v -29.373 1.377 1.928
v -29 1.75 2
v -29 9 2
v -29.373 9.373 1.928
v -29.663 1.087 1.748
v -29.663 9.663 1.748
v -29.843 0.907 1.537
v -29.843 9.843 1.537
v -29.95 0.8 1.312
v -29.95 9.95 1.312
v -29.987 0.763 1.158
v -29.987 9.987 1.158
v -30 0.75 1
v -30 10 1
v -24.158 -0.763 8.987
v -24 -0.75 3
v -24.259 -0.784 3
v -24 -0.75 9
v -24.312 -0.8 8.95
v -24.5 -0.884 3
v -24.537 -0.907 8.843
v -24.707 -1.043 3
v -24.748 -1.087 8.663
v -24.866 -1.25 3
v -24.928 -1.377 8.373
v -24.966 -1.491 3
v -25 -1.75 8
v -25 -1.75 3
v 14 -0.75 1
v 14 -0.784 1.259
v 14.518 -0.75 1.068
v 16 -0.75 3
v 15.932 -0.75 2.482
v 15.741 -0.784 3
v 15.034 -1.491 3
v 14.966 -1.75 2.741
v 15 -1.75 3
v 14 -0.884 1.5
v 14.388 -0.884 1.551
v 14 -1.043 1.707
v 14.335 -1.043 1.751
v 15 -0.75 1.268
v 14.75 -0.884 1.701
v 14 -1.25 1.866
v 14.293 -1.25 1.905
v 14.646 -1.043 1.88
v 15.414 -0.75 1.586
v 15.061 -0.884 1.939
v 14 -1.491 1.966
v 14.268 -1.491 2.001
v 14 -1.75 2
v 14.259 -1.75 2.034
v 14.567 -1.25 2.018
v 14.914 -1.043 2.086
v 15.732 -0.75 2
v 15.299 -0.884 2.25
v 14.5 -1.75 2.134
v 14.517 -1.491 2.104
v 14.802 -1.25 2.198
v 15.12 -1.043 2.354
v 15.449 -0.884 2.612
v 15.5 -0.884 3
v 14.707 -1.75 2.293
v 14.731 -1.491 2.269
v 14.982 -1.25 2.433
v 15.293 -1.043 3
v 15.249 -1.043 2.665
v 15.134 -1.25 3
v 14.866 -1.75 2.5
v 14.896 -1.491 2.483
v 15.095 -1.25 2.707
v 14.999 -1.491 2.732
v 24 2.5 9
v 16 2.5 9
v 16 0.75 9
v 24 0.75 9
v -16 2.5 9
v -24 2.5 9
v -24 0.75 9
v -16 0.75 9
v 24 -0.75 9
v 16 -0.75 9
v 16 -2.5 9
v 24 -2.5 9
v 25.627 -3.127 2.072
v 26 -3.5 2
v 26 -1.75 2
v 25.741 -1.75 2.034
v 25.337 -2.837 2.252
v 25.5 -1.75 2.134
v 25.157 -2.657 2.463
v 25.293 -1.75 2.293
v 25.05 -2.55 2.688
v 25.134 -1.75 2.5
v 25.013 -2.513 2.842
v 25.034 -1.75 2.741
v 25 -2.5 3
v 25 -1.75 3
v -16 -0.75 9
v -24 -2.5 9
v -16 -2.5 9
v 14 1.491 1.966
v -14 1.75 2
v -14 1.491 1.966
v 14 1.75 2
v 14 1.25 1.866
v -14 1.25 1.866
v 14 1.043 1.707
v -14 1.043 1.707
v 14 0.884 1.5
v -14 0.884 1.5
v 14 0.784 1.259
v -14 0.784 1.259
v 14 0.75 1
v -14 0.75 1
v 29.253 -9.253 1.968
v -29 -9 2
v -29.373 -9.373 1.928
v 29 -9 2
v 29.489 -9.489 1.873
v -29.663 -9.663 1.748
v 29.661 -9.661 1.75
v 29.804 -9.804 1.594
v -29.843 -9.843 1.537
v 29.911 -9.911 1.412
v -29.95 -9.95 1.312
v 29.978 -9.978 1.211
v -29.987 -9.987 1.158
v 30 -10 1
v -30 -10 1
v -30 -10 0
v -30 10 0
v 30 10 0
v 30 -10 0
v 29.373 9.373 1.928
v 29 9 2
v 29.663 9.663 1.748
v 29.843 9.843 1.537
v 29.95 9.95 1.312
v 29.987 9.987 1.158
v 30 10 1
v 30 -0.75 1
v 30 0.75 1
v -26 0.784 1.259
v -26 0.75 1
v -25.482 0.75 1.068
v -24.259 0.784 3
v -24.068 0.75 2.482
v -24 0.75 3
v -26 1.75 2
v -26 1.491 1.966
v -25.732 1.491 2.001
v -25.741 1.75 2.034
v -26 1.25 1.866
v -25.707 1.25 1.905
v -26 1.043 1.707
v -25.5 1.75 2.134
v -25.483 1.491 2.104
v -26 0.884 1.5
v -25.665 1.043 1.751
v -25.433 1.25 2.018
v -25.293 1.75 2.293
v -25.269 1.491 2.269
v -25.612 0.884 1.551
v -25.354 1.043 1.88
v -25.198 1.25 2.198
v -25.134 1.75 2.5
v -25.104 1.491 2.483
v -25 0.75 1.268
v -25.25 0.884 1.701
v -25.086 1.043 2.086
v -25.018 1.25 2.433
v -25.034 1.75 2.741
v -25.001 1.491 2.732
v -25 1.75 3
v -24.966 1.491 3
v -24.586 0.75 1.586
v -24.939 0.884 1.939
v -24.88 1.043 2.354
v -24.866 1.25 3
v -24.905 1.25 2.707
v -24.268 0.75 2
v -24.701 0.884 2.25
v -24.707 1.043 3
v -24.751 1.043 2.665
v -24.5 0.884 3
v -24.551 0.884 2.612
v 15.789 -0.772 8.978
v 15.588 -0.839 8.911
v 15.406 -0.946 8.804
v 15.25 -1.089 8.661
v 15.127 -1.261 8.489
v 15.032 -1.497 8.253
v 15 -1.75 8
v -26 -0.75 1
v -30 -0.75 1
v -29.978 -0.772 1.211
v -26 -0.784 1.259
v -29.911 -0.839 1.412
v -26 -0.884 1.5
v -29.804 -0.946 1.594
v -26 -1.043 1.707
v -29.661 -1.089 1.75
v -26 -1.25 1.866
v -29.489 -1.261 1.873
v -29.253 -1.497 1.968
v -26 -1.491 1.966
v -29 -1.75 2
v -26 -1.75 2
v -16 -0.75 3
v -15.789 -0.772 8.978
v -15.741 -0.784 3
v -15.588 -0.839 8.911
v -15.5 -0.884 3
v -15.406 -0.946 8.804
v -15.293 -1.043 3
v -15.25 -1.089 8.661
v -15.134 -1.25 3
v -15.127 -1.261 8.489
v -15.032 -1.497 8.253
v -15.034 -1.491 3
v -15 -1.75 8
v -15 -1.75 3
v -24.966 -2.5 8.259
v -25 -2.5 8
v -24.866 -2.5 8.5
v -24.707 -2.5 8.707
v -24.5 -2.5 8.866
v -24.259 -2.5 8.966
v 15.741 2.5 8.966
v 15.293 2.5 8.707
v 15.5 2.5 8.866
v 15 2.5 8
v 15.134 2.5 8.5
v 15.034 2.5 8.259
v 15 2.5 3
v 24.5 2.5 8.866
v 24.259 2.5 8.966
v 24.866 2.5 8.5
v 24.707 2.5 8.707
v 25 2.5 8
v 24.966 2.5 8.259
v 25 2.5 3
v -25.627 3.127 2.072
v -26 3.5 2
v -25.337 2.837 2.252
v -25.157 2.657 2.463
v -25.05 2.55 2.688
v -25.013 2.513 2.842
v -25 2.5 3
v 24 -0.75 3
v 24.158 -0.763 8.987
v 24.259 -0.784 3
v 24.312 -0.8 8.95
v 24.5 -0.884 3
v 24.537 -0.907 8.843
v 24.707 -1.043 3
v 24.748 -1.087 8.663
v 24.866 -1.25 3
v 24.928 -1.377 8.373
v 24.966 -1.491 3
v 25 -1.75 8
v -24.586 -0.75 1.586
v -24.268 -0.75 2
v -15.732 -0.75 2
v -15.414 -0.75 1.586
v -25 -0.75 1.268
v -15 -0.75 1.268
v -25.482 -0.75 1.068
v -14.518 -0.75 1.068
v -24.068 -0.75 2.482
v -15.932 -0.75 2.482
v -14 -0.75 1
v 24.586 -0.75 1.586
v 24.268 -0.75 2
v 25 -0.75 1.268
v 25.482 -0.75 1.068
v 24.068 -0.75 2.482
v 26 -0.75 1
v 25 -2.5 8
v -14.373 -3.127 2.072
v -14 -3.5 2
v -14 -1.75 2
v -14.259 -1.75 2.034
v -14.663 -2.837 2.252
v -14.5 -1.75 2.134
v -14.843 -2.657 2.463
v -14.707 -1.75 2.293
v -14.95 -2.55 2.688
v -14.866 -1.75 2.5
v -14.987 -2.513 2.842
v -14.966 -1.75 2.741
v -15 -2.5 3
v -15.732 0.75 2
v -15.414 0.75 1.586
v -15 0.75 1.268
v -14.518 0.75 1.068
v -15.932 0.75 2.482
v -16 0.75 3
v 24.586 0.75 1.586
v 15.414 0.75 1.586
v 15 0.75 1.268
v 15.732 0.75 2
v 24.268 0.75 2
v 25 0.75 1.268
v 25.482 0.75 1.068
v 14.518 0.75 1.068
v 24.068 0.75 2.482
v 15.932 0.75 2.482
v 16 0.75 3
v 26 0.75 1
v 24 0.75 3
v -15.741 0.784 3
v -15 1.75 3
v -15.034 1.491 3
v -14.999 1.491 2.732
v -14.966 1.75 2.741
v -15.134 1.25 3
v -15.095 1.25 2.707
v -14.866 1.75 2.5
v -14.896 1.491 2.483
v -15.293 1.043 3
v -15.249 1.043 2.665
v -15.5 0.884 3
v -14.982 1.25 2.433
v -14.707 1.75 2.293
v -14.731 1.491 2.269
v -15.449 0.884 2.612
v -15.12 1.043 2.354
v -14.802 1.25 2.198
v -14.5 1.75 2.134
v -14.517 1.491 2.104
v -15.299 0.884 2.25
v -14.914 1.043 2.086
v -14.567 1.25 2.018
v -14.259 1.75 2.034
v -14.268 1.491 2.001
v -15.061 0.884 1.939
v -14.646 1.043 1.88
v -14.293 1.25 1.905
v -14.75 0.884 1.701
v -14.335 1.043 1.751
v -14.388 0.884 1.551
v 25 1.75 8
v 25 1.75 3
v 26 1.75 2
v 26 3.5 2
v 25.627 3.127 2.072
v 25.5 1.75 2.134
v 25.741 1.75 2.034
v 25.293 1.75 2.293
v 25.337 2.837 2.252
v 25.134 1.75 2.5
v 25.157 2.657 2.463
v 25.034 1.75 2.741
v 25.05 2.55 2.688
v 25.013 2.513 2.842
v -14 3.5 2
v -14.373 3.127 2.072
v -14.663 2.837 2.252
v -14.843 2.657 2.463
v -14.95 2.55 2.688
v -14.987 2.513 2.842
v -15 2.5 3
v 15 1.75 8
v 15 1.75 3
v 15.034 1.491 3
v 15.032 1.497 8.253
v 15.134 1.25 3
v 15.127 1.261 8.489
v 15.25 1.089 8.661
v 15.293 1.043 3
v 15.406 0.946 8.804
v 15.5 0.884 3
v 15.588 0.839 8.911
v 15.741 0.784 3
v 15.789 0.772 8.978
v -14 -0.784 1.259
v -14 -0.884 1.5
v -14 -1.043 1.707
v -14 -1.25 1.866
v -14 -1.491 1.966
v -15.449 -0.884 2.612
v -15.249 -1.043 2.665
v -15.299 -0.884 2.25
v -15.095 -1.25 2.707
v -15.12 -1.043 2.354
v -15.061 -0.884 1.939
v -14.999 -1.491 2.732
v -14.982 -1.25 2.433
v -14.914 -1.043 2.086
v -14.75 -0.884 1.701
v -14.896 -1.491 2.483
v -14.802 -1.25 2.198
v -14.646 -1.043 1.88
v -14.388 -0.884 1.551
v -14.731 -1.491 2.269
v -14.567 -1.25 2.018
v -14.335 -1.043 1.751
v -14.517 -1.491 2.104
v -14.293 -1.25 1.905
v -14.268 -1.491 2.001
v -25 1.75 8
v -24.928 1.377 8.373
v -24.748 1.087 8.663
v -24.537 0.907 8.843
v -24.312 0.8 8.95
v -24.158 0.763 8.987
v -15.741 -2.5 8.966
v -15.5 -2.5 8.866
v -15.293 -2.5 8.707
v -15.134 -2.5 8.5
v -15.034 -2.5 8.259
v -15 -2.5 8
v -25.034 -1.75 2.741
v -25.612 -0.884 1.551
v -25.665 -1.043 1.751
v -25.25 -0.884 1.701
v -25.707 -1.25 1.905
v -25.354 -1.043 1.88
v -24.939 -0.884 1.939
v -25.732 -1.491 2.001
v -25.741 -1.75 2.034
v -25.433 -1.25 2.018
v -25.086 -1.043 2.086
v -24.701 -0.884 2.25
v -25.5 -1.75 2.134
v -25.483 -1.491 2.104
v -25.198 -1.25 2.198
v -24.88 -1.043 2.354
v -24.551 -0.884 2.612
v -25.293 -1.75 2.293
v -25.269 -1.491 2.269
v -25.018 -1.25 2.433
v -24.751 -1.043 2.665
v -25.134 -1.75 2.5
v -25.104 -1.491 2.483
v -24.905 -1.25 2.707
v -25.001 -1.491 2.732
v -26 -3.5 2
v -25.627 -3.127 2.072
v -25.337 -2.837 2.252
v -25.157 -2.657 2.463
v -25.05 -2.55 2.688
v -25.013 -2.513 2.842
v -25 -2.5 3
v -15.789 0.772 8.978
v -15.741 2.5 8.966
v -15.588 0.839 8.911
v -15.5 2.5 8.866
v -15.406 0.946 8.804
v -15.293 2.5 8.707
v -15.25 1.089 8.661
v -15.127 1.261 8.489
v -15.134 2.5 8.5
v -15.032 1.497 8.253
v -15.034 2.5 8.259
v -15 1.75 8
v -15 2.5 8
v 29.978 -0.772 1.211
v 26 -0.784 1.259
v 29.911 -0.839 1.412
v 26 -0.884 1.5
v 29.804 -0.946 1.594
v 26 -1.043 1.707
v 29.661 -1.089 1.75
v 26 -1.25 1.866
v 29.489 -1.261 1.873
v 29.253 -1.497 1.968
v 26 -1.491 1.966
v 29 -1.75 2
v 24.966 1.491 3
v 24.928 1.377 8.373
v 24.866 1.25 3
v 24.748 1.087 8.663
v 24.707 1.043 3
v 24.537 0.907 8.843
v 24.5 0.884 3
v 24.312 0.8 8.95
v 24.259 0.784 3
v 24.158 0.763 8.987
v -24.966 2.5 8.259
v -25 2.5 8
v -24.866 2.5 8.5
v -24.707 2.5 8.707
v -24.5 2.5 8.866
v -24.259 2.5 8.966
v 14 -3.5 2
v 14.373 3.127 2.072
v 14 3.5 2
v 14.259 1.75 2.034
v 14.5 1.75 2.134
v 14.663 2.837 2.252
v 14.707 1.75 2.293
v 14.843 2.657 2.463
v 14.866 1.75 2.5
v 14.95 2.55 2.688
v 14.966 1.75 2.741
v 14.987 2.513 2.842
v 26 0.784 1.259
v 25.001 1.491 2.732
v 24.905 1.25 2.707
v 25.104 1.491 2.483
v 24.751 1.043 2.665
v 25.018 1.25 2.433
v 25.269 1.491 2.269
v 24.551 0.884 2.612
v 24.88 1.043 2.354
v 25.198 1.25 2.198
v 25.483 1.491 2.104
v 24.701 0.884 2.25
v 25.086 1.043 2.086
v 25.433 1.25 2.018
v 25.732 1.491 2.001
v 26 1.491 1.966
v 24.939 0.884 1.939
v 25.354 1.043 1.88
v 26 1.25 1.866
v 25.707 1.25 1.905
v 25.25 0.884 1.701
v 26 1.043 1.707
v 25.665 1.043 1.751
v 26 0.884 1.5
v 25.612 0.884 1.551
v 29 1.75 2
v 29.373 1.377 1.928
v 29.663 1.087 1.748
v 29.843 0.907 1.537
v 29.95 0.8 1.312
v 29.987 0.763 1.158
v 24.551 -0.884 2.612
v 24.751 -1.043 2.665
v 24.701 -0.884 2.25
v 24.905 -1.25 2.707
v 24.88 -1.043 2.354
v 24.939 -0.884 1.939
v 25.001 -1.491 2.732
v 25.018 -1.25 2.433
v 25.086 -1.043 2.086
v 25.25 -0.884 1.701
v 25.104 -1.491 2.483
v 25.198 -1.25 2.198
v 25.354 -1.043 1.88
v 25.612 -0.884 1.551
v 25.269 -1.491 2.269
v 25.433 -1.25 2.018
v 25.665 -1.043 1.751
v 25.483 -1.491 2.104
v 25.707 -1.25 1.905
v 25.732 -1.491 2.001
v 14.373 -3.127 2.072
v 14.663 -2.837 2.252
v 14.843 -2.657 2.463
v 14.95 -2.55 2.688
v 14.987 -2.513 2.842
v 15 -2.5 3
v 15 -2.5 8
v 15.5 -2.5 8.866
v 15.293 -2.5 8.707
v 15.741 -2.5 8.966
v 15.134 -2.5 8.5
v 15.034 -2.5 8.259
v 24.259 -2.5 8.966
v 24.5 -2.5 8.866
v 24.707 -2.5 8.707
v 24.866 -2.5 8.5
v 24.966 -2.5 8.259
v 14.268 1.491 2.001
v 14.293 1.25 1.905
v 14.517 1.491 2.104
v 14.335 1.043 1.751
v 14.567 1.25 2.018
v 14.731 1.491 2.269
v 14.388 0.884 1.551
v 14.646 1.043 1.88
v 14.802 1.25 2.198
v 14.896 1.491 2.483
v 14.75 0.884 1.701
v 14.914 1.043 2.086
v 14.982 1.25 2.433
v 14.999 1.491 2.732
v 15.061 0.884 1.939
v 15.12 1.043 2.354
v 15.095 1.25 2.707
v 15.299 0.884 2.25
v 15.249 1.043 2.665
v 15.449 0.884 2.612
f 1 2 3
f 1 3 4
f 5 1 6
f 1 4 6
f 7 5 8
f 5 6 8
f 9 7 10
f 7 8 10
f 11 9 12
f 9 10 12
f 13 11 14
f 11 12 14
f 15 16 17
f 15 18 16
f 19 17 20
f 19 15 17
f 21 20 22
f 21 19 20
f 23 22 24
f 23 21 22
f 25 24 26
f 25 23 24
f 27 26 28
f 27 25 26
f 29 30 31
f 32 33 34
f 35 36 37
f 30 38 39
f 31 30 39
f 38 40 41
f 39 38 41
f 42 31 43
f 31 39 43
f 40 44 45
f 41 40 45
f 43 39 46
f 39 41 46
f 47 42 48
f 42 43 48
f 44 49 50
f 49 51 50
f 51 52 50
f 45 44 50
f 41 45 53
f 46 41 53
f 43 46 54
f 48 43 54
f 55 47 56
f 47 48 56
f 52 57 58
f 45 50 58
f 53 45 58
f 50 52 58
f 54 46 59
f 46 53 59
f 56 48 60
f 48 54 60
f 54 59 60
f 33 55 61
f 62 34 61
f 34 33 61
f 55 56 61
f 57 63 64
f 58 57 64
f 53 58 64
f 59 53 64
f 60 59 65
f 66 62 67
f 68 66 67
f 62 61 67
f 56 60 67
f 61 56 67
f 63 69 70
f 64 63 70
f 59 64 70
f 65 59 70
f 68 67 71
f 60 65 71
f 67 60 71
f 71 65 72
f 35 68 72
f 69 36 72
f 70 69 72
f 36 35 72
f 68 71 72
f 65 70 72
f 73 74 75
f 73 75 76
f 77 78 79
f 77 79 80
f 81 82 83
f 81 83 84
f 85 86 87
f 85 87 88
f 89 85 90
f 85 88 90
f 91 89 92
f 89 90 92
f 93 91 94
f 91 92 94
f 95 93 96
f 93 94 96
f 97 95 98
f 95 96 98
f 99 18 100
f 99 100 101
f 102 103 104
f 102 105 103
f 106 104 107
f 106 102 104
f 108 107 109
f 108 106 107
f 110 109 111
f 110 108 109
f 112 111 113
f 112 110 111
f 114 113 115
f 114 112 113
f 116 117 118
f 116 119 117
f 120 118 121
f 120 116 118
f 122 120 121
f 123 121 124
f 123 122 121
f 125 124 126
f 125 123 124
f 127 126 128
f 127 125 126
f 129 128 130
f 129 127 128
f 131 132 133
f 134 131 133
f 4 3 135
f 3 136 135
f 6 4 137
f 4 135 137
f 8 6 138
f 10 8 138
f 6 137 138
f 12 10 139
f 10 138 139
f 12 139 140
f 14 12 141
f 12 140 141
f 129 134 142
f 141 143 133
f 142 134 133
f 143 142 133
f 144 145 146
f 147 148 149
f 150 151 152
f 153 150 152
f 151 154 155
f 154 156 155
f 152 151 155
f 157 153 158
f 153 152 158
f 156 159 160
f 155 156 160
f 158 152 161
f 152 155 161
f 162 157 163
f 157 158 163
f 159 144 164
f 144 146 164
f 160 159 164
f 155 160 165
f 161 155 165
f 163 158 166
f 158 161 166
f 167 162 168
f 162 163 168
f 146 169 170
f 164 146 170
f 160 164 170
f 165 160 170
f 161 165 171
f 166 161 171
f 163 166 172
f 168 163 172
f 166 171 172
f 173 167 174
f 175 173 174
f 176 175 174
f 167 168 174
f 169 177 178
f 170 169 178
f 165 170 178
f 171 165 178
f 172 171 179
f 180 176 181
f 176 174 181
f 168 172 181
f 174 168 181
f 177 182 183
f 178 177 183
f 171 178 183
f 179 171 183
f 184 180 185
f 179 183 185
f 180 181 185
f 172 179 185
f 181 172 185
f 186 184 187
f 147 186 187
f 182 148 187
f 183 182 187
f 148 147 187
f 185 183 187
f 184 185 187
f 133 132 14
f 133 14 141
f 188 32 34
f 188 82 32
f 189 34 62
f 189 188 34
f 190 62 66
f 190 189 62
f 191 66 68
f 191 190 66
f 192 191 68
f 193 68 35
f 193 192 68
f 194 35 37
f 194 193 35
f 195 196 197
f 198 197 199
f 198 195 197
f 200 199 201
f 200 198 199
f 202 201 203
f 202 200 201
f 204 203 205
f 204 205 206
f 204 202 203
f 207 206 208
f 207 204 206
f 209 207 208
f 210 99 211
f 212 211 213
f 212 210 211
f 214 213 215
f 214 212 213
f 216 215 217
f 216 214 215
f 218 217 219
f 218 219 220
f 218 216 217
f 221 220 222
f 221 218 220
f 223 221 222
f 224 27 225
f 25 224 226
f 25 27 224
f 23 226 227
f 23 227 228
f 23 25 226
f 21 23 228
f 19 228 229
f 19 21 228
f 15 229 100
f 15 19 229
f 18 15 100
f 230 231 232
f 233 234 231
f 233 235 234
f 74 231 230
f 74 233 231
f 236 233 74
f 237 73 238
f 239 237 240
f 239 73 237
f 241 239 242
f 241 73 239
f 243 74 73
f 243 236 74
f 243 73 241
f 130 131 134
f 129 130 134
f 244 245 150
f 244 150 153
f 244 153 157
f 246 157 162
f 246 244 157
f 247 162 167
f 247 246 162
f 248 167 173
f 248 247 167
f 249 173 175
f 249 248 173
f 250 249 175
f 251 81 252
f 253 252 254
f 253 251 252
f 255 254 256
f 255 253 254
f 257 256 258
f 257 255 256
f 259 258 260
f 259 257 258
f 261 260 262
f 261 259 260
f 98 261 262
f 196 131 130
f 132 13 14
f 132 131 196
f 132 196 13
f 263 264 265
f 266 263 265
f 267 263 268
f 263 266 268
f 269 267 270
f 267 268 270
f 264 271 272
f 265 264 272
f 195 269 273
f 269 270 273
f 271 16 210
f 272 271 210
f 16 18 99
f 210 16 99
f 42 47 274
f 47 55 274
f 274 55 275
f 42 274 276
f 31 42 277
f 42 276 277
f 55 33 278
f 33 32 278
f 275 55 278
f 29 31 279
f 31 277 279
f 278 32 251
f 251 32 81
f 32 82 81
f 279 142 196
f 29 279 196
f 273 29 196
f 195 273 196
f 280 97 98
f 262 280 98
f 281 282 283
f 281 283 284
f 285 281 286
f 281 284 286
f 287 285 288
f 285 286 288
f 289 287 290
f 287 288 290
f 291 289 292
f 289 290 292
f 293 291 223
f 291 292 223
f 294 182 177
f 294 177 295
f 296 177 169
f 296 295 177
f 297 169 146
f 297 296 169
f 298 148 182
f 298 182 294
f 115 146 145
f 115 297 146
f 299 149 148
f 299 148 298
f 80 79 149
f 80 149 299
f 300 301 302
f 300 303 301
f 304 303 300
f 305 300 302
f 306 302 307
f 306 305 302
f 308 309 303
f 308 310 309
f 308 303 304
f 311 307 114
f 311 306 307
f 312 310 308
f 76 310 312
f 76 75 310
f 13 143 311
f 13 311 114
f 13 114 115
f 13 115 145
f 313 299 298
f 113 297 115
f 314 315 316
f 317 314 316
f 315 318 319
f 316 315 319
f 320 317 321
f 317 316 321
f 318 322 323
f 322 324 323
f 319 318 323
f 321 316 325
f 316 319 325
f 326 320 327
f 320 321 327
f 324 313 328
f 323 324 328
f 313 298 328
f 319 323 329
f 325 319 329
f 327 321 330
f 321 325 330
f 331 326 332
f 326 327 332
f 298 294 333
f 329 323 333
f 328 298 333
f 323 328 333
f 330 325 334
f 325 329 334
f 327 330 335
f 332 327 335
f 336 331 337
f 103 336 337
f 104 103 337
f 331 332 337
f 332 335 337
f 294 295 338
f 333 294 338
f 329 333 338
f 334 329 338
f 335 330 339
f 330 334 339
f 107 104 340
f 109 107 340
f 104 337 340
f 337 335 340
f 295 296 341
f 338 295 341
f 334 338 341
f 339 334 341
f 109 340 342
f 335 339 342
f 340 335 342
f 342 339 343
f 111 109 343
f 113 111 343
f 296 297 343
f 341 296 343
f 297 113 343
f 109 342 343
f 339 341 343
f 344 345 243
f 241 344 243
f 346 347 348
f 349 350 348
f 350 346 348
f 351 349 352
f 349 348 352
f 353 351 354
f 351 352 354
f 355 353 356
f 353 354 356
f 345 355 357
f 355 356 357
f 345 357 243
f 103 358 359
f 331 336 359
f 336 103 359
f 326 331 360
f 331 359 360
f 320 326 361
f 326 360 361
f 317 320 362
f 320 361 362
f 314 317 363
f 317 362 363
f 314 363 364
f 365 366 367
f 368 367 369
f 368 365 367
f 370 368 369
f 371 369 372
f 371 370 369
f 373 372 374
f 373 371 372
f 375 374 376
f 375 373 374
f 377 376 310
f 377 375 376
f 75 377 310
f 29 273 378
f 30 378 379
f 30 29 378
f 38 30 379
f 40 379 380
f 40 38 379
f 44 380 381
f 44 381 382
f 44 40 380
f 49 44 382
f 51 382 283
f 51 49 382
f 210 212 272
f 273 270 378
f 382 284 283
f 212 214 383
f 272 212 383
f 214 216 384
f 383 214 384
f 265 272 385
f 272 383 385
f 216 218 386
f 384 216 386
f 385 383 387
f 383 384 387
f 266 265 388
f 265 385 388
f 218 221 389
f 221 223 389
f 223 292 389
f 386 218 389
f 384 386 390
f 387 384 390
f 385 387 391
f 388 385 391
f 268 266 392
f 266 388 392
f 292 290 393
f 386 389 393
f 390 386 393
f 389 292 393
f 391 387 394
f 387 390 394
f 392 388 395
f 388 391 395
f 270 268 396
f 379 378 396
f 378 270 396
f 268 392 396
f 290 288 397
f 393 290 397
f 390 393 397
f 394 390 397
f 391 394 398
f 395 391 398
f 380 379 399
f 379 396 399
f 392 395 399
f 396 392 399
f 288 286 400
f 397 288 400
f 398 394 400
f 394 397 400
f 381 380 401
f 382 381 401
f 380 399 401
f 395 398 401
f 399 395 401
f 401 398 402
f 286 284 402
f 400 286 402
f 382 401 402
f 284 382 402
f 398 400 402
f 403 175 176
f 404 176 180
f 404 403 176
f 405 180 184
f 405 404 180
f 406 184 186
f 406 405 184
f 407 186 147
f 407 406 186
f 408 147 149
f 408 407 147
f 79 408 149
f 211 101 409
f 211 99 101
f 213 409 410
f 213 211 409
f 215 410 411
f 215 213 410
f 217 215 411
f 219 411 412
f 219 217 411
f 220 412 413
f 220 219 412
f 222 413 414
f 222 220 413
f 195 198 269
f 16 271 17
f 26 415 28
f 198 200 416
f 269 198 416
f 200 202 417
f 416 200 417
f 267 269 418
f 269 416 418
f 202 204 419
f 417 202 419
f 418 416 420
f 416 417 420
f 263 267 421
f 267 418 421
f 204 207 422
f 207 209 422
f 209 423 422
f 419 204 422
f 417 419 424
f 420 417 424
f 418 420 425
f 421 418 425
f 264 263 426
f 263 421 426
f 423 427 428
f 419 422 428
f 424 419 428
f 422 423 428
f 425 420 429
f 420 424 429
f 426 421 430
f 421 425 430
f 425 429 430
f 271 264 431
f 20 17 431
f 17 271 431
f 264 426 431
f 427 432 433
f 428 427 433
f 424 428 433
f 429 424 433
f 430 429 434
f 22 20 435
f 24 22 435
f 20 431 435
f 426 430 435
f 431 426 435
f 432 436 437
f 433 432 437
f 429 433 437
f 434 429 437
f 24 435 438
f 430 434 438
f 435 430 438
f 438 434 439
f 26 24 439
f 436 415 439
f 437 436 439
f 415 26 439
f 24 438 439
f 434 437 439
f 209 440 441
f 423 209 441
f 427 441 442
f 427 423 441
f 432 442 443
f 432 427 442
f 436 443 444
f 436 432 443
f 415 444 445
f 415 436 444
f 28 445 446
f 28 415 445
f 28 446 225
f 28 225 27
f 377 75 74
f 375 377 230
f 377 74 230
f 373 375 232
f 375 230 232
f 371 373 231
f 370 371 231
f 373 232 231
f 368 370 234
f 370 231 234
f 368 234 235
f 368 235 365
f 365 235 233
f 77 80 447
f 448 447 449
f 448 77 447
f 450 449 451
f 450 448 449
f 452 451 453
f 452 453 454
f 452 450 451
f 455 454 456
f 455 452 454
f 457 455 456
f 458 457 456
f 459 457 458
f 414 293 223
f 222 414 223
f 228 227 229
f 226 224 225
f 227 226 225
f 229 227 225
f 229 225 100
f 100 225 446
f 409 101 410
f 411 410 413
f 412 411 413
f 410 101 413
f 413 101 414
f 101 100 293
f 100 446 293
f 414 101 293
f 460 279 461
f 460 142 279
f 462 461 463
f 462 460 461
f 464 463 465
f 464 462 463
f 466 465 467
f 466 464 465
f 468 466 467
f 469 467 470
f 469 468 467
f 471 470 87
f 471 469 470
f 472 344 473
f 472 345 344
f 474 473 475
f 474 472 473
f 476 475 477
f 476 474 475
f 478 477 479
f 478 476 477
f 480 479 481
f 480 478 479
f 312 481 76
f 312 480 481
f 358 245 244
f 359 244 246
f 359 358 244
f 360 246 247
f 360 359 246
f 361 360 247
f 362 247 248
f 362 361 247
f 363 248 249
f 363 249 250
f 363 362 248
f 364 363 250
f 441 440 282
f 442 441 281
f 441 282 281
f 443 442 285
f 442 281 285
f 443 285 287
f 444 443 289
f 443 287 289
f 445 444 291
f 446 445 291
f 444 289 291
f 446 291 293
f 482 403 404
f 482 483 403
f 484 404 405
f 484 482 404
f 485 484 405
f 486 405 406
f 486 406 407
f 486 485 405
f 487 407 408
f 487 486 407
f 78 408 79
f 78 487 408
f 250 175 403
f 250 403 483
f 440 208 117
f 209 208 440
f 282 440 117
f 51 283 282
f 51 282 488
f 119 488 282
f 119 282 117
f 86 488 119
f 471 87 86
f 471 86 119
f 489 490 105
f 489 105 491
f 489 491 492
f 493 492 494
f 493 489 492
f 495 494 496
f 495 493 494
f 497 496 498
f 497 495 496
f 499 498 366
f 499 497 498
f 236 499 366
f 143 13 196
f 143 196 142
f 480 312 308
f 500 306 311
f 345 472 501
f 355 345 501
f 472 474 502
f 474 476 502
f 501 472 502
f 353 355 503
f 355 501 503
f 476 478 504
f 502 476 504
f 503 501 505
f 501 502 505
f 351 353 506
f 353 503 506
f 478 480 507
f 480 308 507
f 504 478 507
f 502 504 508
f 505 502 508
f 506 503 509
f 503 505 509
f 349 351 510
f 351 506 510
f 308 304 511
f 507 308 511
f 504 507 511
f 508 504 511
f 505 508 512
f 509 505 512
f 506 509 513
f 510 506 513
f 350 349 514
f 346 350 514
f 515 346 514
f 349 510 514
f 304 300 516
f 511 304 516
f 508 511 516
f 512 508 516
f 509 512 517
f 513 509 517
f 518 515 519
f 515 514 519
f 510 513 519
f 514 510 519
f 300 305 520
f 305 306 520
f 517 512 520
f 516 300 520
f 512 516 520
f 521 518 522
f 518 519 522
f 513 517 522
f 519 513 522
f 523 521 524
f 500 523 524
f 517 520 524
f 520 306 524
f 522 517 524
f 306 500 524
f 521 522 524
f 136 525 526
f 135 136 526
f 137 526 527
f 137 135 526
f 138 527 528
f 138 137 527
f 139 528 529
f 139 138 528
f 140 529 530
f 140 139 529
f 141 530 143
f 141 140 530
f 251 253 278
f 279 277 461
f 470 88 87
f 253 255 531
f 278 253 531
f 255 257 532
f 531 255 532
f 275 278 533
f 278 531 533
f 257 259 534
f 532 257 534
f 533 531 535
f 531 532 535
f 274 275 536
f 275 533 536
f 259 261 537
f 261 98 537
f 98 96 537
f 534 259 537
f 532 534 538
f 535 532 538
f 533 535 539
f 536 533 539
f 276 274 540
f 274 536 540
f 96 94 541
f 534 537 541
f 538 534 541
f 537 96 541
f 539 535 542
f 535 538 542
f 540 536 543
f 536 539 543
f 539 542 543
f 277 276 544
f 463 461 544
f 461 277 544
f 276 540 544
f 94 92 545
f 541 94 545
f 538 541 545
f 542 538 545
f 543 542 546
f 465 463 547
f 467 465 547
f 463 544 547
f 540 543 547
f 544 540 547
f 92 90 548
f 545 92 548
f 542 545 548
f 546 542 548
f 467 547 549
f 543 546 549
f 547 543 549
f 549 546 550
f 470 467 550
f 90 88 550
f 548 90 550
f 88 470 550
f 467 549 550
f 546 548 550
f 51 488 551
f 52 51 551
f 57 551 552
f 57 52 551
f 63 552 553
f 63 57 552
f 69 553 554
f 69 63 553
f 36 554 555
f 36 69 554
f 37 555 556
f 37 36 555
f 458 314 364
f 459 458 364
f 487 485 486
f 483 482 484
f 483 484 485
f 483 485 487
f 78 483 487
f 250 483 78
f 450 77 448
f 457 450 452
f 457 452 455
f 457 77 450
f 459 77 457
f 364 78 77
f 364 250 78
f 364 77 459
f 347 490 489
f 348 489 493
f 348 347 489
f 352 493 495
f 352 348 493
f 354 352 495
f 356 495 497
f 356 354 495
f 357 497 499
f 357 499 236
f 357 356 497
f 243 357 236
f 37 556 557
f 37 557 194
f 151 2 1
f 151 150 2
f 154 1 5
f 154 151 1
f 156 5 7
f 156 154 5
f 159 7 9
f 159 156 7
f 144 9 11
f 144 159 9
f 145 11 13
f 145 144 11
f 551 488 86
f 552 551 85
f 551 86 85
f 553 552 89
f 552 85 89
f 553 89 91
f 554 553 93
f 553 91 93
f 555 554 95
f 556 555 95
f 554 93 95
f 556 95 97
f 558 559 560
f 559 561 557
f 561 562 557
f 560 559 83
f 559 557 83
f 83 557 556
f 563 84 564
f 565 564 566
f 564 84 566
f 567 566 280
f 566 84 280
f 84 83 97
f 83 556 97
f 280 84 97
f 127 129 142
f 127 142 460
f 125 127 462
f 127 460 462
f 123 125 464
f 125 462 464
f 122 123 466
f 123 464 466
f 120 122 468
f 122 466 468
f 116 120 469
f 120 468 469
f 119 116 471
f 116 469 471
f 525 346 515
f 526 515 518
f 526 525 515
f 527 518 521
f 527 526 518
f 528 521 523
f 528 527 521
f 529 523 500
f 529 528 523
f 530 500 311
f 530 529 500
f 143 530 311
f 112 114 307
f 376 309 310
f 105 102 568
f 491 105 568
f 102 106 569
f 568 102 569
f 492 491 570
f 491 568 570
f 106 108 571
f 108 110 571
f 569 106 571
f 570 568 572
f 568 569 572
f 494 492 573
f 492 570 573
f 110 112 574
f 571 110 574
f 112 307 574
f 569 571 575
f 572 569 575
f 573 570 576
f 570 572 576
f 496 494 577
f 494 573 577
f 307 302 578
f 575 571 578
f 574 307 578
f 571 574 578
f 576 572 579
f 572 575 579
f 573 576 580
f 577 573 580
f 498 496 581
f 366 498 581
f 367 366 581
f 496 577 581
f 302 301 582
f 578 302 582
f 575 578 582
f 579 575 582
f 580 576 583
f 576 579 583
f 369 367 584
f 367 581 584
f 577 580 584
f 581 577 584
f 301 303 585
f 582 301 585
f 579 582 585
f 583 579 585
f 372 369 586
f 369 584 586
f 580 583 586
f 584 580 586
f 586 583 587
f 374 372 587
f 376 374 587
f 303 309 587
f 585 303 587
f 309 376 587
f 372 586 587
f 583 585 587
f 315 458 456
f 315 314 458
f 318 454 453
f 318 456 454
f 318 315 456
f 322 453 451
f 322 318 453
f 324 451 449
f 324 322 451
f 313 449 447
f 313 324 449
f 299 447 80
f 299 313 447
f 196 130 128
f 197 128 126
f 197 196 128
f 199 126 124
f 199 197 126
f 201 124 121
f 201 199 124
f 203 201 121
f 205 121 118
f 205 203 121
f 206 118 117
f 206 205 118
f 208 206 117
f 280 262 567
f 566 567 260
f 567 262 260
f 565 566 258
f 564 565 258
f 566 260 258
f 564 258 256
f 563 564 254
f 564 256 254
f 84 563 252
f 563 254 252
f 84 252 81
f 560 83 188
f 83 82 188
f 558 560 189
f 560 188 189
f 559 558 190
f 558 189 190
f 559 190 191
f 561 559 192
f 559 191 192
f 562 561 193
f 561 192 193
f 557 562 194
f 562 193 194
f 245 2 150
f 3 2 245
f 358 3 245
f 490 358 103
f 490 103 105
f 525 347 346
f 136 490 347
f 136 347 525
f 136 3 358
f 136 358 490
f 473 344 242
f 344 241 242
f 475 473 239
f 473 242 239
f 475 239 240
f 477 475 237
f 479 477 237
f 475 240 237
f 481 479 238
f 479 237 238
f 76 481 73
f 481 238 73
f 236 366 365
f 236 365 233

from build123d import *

# Parameters (mm, degrees)
F0_W     = 60
F0_H     = 20
F1_DEPTH = 2
F2_W     = 10
F2_H     = 5
F3_DEPTH = 7
F4_W     = 60
F4_H     = 1.5
F5_DEPTH = 8
F6_F1_R  = 1
F6_F2_R  = 0.9999


# Not quite as in the source:
# - a fillet or chamfer is up to 0.001 mm smaller than in the source, because OpenCascade refuses the exact size


with BuildPart() as f1:
    # F0 (on Top) → F1 (new body)
    with BuildSketch(Plane.XY):
        Rectangle(F0_W, F0_H)
    extrude(amount=F1_DEPTH)

    # F2 (on face) → F3 (join)
    with BuildSketch(Plane.XY.offset(2)):
        with Locations((-20, 0)):
            Rectangle(F2_W, F2_H)
        with Locations((20, 0)):
            Rectangle(F2_W, F2_H)
    extrude(amount=F3_DEPTH)

    # F4 (on face) → F5 (cut)
    with BuildSketch(Plane.XY.offset(9)):
        Rectangle(F4_W, F4_H)
    extrude(amount=-F5_DEPTH, mode=Mode.SUBTRACT)

    # F6: fillet of radius 1 on 32 edges, made by hand

    # F6_f1
    f6_f1_edges = [f1.edges().sort_by_distance(p)[0] for p in [
        (-25, -1.625, 2),
        (-20, -2.5, 2),
        (-15, -1.625, 2),
        (15, -1.625, 2),
        (20, -2.5, 2),
        (25, -1.625, 2),
        (25, 1.625, 2),
        (20, 2.5, 2),
        (15, 1.625, 2),
        (-15, 1.625, 2),
        (-20, 2.5, 2),
        (-25, 1.625, 2),
    ]]
    fillet(f6_f1_edges, radius=F6_F1_R)

    # F6_f2 (radius 1 in the source; OpenCascade refuses exactly that, so slightly less here)
    f6_f2_edges = [f1.edges().sort_by_distance(p)[0] for p in [
        (-15, 1.625, 9),
        (-25, 1.625, 9),
        (-25, -1.625, 9),
        (-15, -1.625, 9),
        (15, 1.625, 9),
        (15, -1.625, 9),
        (25, 1.625, 9),
        (25, -1.625, 9),
        (-28, -0.75, 2),
        (0, -0.75, 2),
        (28, -0.75, 2),
        (30, -5.375, 2),
        (0, -10, 2),
        (-30, -5.375, 2),
        (0, 10, 2),
        (30, 5.375, 2),
        (28, 0.75, 2),
        (0, 0.75, 2),
        (-28, 0.75, 2),
        (-30, 5.375, 2),
        (-25.2928932188, 0.75, 2.2928932188),
        (14.7071067812, 0.75, 2.2928932188),
        (-14.7071067812, 0.75, 2.2928932188),
        (25.2928932188, 0.75, 2.2928932188),
        (25.2928932188, -0.75, 2.2928932188),
        (-14.7071067812, -0.75, 2.2928932188),
        (14.7071067812, -0.75, 2.2928932188),
        (-25.2928932188, -0.75, 2.2928932188),
    ]]
    fillet(f6_f2_edges, radius=F6_F2_R)


solid = f1.part
